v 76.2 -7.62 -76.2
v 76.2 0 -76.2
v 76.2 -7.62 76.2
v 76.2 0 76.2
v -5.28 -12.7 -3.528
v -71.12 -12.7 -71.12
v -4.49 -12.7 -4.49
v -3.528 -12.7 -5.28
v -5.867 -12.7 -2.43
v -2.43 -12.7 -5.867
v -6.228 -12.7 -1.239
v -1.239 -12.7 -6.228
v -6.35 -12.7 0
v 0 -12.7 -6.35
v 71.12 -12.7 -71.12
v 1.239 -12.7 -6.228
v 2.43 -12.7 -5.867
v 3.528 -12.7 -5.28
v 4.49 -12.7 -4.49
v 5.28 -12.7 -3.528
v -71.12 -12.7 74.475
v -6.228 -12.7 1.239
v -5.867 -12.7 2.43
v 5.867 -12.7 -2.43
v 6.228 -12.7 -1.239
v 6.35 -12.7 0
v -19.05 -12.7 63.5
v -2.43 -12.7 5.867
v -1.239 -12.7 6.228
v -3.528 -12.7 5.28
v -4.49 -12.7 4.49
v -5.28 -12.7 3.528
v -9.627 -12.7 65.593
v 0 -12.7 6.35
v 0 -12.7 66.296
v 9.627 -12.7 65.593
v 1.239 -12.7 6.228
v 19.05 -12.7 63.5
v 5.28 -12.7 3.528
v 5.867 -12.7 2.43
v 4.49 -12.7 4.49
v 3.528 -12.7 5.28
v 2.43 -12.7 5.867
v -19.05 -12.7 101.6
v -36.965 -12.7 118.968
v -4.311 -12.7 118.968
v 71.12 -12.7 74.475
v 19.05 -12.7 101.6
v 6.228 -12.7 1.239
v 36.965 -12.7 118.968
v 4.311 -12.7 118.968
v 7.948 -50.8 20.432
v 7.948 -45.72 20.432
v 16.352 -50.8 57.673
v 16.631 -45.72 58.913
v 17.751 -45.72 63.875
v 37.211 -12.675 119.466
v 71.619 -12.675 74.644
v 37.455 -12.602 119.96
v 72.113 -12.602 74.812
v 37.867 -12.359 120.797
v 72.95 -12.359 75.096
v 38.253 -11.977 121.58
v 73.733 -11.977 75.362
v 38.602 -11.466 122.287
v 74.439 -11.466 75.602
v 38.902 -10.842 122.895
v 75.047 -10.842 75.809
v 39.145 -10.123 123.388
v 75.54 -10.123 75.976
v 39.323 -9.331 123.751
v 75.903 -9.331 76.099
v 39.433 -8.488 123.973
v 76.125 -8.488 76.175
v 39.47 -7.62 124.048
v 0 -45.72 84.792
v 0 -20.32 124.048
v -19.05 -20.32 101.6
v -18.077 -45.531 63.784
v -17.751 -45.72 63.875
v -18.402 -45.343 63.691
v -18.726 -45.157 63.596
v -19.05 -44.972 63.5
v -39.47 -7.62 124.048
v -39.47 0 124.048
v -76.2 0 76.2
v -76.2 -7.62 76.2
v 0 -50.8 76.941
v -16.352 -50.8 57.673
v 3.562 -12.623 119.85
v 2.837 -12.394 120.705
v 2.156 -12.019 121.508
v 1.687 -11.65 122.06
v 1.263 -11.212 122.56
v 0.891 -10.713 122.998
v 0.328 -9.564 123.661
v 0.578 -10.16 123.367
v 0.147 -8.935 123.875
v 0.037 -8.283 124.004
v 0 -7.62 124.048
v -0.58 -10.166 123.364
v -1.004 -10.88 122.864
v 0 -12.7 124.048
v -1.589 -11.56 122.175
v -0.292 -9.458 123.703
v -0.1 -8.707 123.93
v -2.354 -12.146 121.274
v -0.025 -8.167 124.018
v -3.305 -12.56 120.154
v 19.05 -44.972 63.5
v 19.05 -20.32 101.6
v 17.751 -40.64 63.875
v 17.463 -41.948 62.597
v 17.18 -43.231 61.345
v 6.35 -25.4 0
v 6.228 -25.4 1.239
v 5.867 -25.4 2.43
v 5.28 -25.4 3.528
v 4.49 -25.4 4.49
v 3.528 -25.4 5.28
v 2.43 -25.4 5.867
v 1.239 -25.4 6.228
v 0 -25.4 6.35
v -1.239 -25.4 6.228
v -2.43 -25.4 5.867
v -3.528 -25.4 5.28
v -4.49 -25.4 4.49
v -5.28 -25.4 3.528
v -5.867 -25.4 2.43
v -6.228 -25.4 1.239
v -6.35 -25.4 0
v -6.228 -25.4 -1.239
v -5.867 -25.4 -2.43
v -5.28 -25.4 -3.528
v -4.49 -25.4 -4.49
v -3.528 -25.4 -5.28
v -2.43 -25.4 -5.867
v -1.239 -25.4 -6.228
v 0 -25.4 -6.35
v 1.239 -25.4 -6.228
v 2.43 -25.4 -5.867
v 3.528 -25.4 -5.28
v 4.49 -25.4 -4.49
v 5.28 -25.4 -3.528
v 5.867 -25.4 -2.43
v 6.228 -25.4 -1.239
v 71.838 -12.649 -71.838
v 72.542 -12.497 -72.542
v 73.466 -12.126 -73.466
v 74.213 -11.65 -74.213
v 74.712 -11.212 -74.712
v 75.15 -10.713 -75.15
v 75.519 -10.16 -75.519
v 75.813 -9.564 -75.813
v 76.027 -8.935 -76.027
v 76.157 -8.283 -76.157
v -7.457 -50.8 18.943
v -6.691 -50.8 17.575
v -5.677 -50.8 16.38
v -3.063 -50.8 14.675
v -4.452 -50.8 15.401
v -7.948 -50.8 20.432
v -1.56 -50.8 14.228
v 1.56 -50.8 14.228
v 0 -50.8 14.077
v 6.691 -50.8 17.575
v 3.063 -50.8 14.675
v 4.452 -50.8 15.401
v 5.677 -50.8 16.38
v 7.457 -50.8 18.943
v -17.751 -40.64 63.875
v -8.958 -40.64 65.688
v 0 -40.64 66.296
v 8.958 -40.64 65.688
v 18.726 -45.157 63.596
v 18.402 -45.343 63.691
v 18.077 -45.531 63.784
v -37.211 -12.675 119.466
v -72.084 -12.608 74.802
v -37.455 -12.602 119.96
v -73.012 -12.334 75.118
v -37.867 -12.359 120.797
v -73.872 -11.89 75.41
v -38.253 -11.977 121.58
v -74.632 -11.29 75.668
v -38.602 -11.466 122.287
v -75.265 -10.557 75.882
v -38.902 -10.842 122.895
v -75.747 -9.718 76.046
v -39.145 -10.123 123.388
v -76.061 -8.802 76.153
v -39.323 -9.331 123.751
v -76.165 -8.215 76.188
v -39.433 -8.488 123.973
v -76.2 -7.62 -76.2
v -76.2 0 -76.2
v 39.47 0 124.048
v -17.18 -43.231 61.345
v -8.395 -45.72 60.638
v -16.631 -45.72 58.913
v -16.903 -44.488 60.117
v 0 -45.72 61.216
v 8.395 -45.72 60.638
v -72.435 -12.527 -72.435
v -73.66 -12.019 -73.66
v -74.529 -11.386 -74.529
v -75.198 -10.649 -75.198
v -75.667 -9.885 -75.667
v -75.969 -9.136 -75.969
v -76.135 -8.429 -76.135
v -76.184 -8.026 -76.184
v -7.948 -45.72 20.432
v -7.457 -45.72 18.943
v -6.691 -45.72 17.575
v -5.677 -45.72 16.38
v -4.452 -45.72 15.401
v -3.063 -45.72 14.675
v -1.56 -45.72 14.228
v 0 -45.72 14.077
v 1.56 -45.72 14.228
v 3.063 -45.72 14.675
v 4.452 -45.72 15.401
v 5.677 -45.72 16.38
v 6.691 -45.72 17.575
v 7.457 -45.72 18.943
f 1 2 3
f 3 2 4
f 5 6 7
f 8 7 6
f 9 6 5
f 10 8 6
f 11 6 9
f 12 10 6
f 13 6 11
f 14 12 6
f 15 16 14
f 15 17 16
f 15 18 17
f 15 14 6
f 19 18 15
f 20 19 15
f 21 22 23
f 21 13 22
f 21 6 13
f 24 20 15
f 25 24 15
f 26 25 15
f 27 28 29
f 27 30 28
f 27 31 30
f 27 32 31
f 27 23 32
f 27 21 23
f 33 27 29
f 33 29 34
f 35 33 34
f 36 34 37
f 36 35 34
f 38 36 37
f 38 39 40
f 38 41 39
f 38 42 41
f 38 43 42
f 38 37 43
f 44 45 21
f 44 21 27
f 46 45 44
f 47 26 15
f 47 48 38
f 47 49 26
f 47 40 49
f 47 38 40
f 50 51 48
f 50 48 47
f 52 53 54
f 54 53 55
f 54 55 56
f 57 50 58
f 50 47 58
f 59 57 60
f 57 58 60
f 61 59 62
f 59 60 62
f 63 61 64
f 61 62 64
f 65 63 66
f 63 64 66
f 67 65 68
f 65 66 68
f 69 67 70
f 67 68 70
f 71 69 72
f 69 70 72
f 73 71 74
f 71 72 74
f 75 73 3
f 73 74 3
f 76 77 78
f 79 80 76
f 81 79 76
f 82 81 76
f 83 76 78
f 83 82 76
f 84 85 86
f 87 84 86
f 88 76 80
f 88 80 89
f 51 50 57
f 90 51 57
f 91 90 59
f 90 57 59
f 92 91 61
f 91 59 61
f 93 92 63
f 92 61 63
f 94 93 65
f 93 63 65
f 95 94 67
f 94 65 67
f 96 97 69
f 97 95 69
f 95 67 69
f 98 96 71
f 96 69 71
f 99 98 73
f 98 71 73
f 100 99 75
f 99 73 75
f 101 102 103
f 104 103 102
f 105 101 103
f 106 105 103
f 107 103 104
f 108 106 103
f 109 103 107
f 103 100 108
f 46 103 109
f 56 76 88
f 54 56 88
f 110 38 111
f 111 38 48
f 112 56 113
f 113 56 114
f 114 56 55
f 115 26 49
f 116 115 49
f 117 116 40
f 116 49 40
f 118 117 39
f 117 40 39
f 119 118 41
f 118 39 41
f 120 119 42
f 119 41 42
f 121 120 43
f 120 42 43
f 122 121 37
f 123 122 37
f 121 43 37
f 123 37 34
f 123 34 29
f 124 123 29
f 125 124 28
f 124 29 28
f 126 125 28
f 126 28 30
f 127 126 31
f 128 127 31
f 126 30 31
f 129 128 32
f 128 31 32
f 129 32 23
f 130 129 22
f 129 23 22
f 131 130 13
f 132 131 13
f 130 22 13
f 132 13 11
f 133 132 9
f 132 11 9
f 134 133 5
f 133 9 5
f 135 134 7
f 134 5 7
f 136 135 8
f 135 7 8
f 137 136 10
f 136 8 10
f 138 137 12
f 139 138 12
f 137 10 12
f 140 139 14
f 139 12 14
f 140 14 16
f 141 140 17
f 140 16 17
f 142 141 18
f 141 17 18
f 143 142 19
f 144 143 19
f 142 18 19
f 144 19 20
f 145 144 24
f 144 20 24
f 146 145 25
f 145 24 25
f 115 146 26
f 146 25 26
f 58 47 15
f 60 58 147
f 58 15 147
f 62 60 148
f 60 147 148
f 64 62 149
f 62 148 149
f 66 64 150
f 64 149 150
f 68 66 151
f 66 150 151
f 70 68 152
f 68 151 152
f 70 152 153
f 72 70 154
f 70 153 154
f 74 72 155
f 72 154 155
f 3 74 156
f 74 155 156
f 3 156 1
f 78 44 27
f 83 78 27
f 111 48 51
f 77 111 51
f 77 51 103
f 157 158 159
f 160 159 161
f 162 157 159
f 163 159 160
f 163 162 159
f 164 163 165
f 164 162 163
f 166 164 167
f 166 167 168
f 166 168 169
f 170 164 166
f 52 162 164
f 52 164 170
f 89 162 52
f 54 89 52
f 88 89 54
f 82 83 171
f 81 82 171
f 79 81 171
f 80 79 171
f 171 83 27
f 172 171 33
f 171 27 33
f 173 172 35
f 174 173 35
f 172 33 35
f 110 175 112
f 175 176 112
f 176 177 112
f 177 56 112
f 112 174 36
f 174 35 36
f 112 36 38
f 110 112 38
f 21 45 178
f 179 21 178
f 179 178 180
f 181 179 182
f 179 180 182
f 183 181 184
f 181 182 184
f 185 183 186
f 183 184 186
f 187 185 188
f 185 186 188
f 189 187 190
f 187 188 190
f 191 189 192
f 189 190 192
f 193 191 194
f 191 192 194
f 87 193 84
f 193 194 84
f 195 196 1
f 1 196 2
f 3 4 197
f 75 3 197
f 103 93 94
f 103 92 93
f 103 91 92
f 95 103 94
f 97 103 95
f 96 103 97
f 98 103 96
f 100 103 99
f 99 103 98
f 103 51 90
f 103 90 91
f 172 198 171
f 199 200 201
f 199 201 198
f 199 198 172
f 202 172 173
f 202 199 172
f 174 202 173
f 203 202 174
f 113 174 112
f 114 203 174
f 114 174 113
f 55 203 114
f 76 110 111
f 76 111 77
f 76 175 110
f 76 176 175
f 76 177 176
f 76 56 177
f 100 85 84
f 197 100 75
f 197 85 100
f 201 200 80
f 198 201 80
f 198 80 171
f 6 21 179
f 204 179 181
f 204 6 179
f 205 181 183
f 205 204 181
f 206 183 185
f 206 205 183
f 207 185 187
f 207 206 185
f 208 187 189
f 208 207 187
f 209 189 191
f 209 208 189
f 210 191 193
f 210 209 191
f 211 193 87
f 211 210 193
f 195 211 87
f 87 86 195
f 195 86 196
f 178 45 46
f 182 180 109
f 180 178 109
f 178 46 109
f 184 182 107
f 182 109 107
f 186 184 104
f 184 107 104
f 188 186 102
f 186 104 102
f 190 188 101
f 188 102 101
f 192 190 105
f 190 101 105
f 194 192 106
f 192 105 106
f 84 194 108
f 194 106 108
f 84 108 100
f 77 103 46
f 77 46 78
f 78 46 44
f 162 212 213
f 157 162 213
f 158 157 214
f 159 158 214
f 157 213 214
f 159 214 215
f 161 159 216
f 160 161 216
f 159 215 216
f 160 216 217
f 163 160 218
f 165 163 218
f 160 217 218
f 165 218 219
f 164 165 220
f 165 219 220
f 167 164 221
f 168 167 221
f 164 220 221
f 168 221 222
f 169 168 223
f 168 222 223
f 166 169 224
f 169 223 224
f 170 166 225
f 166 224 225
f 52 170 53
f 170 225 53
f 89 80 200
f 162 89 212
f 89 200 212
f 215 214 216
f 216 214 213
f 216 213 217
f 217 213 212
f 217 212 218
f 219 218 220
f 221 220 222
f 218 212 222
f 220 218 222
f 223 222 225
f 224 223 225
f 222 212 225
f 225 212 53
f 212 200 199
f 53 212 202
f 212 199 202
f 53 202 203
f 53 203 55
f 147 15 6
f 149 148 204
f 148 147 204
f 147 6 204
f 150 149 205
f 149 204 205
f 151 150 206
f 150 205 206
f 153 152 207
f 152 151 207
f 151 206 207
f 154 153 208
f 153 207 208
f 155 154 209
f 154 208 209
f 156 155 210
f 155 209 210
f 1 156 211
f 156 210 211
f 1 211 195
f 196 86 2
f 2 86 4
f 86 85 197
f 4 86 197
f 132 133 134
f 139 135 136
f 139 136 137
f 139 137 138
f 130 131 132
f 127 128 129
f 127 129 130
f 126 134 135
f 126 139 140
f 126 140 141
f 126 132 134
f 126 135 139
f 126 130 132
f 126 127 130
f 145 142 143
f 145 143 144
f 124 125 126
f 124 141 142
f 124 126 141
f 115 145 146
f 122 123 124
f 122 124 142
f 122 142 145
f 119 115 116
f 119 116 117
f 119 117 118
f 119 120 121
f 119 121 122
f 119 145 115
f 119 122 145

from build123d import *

# Parameters (mm, degrees)
F0_W          = 78.9395868778
F0_H          = 47.8476444364
F1_DEPTH      = 12.7
F2_R          = 6.35
F3_DEPTH      = 12.7
F5_DEPTH      = 33.02
F6_SIZE       = 25.4
F8_DEPTH      = 5.08
F9_T4_ANGLE   = 53.6437900891
F9_T7_DEPTH   = 53.5623511666
F9_T9_DEPTH   = 53.5623511666
F10_T1_DEPTH  = 85.7200228127
F10_T3_DEPTH  = 177.8
F10_T5_DEPTH  = 85.7200228127
F10_T7_DEPTH  = 177.8
F10_T12_DEPTH = 52.1697934389
F10_T17_DEPTH = 52.1697934389


# Not quite as in the source:
# - a fillet or chamfer that OpenCascade refuses, or shapes differently, is made with other operations: its cross-section is extruded or revolved along the edge and cut away or added


with BuildPart() as f1:
    # F0 (on Front) → F1 (new body)
    with BuildSketch(Plane.XZ):
        Polygon((-39.4697934389, 124.0476444364), (-76.2, 76.2), (-39.4697934389, 76.2), align=None)
        Polygon((-39.4697934389, 76.2), (-76.2, 76.2), (-76.2, -76.2), (76.2, -76.2), (76.2, 76.2), (39.4697934389, 76.2), (39.4697934389, 28.3523555636), (-39.4697934389, 28.3523555636), align=None)
        with Locations((0, 100.1238222182)):
            Rectangle(F0_W, F0_H)
        Polygon((39.4697934389, 124.0476444364), (39.4697934389, 76.2), (76.2, 76.2), align=None)
        with Locations((0, 52.2761777818)):
            Rectangle(F0_W, F0_H)
    extrude(amount=F1_DEPTH)

    # F2 (on face) → F3 (join)
    with BuildSketch(Plane.XZ.offset(12.7)):
        Circle(F2_R)
    extrude(amount=F3_DEPTH)

    # F4 (on face) → F5 (join)
    with BuildSketch(Plane.XZ.offset(12.7)):
        Polygon((0, 124.0476444364), (-19.05, 101.6), (19.05, 101.6), align=None)
        with BuildLine():
            Line((19.05, 101.6), (-19.05, 101.6))
            Line((-19.05, 101.6), (-19.05, 63.5))
            ThreePointArc((-19.05, 63.5), (0, 66.2959463316), (19.05, 63.5))
            Line((19.05, 63.5), (19.05, 101.6))
        make_face()
    extrude(amount=F5_DEPTH)

    # F6
    f6_edges = [f1.edges().sort_by_distance(p)[0] for p in [
        (9.525, -45.72, 112.823822),
        (-9.525, -45.72, 112.823822),
    ]]
    chamfer(f6_edges, length=F6_SIZE)

    # F7 (on face) → F8 (join)
    with BuildSketch(Plane.XZ.offset(45.72)):
        with BuildLine():
            ThreePointArc((7.9480178428, 20.4315265516), (8.0977413026, 21.3227137731), (8.1478546035, 22.225))
            ThreePointArc((8.1478546035, 22.225), (-0.9022862269, 30.3227413026), (-7.9480178428, 20.4315265516))
            ThreePointArc((-7.9480178428, 20.4315265516), (0, 14.0771453965), (7.9480178428, 20.4315265516))
        make_face()
        with BuildLine():
            ThreePointArc((-7.9480178428, 20.4315265516), (-0.9022862269, 30.3227413026), (8.1478546035, 22.225))
            ThreePointArc((8.1478546035, 22.225), (8.0977413026, 21.3227137731), (7.9480178428, 20.4315265516))
            Line((7.9480178428, 20.4315265516), (17.7511165922, 63.8752718956))
            ThreePointArc((17.7511165922, 63.8752718956), (0, 66.2959463316), (-17.7511165922, 63.8752718956))
            Line((-17.7511165922, 63.8752718956), (-7.9480178428, 20.4315265516))
        make_face()
        with BuildLine():
            Line((0, 84.7923718226), (-17.7511165922, 63.8752718956))
            ThreePointArc((-17.7511165922, 63.8752718956), (0, 66.2959463316), (17.7511165922, 63.8752718956))
            Line((17.7511165922, 63.8752718956), (0, 84.7923718226))
        make_face()
    extrude(amount=F8_DEPTH)

    # F9: chamfer of 5.08 on 3 edges, made by hand


with BuildPart() as f9_tool2:
    # F9_s3 → F9_t4 (revolve)
    with BuildSketch(Plane(origin=(0, 0, 0), x_dir=(0, 1, 0), z_dir=(-0.8924134547, 0, -0.4512186011))):
        Polygon((-40.64, -66.2959463316), (-45.72, -61.2159463316), (-45.72, -66.2959463316), align=None)
    revolve(axis=Axis((0, -45.72, 0), (0, 1, 0)), revolution_arc=F9_T4_ANGLE)

    split(bisect_by=Plane(origin=(-3.1759235814, 0, -0.7166484437), x_dir=(0, 1, 0), z_dir=(0.9754736958, 0, 0.2201160349)), keep=Keep.TOP)

    split(bisect_by=Plane(origin=(3.1759235814, 0, -0.7166484437), x_dir=(0, 1, 0), z_dir=(-0.9754736958, 0, 0.2201160349)), keep=Keep.TOP)


with BuildPart() as f1_1:
    add(f1.part)

    # F9_t1: union F9_tool2
    add(f9_tool2.part)

    # F9_s8 → F9_t7 (cut)
    with BuildSketch(Plane(origin=(50.284672357, 0, 59.2531467543), x_dir=(0, 1, 0), z_dir=(-0.6470468375, 0, -0.7624502542))):
        Polygon((-45.72, -54.864636032), (-50.8, -49.784636032), (-50.8, -54.864636032), align=None)
    extrude(amount=F9_T7_DEPTH, mode=Mode.SUBTRACT)

    # F9_s10 → F9_t9 (cut)
    with BuildSketch(Plane(origin=(-15.6273224256, 0, 18.4145184935), x_dir=(0, 1, 0), z_dir=(-0.6470468375, 0, 0.7624502542))):
        Polygon((-45.72, -54.864636032), (-50.8, -49.784636032), (-50.8, -54.864636032), align=None)
    extrude(amount=F9_T9_DEPTH, mode=Mode.SUBTRACT)

    # F10: fillet of radius 5.08 on 7 edges, made by hand

    # F10_s2 → F10_t1 (cut)
    with BuildSketch(Plane(origin=(-0.8185365807, 0, 1.0662898725), x_dir=(0, 1, 0), z_dir=(-0.6089222923, 0, 0.7932298797))):
        with BuildLine():
            ThreePointArc((-12.7, -101.7639955007), (-11.2121024484, -105.3560979491), (-7.62, -106.8439955007))
            Line((-7.62, -106.8439955007), (-12.7, -106.8439955007))
            Line((-12.7, -106.8439955007), (-12.7, -101.7639955007))
        make_face()
    extrude(amount=F10_T1_DEPTH, mode=Mode.SUBTRACT)

    # F10_s4 → F10_t3 (cut)
    with BuildSketch(Plane.XY.offset(-88.9)):
        with BuildLine():
            ThreePointArc((71.12, -12.7), (74.7121024484, -11.2121024484), (76.2, -7.62))
            Line((76.2, -7.62), (76.2, -12.7))
            Line((76.2, -12.7), (71.12, -12.7))
        make_face()
        with BuildLine():
            ThreePointArc((-71.12, -12.7), (-74.7121024484, -11.2121024484), (-76.2, -7.62))
            Line((-76.2, -7.62), (-76.2, -12.7))
            Line((-76.2, -12.7), (-71.12, -12.7))
        make_face()
    extrude(amount=F10_T3_DEPTH, mode=Mode.SUBTRACT)

    # F10_s6 → F10_t5 (cut)
    with BuildSketch(Plane(origin=(53.0153693655, 0, 69.0619732521), x_dir=(0, 1, 0), z_dir=(-0.6089222923, 0, -0.7932298797))):
        with BuildLine():
            ThreePointArc((-12.7, -101.7639955007), (-11.2121024484, -105.3560979491), (-7.62, -106.8439955007))
            Line((-7.62, -106.8439955007), (-12.7, -106.8439955007))
            Line((-12.7, -106.8439955007), (-12.7, -101.7639955007))
        make_face()
    extrude(amount=F10_T5_DEPTH, mode=Mode.SUBTRACT)

    # F10_s8 → F10_t7 (cut)
    with BuildSketch(Plane.YZ.offset(-88.9)):
        with BuildLine():
            ThreePointArc((-12.7, -71.12), (-11.2121024484, -74.7121024484), (-7.62, -76.2))
            Line((-7.62, -76.2), (-12.7, -76.2))
            Line((-12.7, -76.2), (-12.7, -71.12))
        make_face()
    extrude(amount=F10_T7_DEPTH, mode=Mode.SUBTRACT)


with BuildPart() as f10_tool10:
    # F10_s11 → F10_t12 (new body)
    with BuildSketch(Plane.YZ.offset(52.1697934389)):
        with BuildLine():
            ThreePointArc((-12.7, 118.9676444364), (-11.2121024484, 122.5597468848), (-7.62, 124.0476444364))
            Line((-7.62, 124.0476444364), (-12.7, 124.0476444364))
            Line((-12.7, 124.0476444364), (-12.7, 118.9676444364))
        make_face()
    extrude(amount=-F10_T12_DEPTH)

    split(bisect_by=Plane(origin=(61.1977921432, 0, 51.9349789077), x_dir=(0, 1, 0), z_dir=(0.7624502542, 0, 0.6470468375)), keep=Keep.TOP)


with BuildPart() as f1_2:
    add(f1_1.part)

    # F10_t9: cut F10_tool10
    add(f10_tool10.part, mode=Mode.SUBTRACT)


with BuildPart() as f10_tool15:
    # F10_s16 → F10_t17 (new body)
    with BuildSketch(Plane.YZ):
        with BuildLine():
            ThreePointArc((-12.7, 118.9676444364), (-11.2121024484, 122.5597468848), (-7.62, 124.0476444364))
            Line((-7.62, 124.0476444364), (-12.7, 124.0476444364))
            Line((-12.7, 124.0476444364), (-12.7, 118.9676444364))
        make_face()
    extrude(amount=-F10_T17_DEPTH)

    split(bisect_by=Plane(origin=(-61.1977921432, 0, 51.9349789077), x_dir=(0, 1, 0), z_dir=(-0.7624502542, 0, 0.6470468375)), keep=Keep.TOP)


with BuildPart() as f1_3:
    add(f1_2.part)

    # F10_t14: cut F10_tool15
    add(f10_tool15.part, mode=Mode.SUBTRACT)


solid = f1_3.part
